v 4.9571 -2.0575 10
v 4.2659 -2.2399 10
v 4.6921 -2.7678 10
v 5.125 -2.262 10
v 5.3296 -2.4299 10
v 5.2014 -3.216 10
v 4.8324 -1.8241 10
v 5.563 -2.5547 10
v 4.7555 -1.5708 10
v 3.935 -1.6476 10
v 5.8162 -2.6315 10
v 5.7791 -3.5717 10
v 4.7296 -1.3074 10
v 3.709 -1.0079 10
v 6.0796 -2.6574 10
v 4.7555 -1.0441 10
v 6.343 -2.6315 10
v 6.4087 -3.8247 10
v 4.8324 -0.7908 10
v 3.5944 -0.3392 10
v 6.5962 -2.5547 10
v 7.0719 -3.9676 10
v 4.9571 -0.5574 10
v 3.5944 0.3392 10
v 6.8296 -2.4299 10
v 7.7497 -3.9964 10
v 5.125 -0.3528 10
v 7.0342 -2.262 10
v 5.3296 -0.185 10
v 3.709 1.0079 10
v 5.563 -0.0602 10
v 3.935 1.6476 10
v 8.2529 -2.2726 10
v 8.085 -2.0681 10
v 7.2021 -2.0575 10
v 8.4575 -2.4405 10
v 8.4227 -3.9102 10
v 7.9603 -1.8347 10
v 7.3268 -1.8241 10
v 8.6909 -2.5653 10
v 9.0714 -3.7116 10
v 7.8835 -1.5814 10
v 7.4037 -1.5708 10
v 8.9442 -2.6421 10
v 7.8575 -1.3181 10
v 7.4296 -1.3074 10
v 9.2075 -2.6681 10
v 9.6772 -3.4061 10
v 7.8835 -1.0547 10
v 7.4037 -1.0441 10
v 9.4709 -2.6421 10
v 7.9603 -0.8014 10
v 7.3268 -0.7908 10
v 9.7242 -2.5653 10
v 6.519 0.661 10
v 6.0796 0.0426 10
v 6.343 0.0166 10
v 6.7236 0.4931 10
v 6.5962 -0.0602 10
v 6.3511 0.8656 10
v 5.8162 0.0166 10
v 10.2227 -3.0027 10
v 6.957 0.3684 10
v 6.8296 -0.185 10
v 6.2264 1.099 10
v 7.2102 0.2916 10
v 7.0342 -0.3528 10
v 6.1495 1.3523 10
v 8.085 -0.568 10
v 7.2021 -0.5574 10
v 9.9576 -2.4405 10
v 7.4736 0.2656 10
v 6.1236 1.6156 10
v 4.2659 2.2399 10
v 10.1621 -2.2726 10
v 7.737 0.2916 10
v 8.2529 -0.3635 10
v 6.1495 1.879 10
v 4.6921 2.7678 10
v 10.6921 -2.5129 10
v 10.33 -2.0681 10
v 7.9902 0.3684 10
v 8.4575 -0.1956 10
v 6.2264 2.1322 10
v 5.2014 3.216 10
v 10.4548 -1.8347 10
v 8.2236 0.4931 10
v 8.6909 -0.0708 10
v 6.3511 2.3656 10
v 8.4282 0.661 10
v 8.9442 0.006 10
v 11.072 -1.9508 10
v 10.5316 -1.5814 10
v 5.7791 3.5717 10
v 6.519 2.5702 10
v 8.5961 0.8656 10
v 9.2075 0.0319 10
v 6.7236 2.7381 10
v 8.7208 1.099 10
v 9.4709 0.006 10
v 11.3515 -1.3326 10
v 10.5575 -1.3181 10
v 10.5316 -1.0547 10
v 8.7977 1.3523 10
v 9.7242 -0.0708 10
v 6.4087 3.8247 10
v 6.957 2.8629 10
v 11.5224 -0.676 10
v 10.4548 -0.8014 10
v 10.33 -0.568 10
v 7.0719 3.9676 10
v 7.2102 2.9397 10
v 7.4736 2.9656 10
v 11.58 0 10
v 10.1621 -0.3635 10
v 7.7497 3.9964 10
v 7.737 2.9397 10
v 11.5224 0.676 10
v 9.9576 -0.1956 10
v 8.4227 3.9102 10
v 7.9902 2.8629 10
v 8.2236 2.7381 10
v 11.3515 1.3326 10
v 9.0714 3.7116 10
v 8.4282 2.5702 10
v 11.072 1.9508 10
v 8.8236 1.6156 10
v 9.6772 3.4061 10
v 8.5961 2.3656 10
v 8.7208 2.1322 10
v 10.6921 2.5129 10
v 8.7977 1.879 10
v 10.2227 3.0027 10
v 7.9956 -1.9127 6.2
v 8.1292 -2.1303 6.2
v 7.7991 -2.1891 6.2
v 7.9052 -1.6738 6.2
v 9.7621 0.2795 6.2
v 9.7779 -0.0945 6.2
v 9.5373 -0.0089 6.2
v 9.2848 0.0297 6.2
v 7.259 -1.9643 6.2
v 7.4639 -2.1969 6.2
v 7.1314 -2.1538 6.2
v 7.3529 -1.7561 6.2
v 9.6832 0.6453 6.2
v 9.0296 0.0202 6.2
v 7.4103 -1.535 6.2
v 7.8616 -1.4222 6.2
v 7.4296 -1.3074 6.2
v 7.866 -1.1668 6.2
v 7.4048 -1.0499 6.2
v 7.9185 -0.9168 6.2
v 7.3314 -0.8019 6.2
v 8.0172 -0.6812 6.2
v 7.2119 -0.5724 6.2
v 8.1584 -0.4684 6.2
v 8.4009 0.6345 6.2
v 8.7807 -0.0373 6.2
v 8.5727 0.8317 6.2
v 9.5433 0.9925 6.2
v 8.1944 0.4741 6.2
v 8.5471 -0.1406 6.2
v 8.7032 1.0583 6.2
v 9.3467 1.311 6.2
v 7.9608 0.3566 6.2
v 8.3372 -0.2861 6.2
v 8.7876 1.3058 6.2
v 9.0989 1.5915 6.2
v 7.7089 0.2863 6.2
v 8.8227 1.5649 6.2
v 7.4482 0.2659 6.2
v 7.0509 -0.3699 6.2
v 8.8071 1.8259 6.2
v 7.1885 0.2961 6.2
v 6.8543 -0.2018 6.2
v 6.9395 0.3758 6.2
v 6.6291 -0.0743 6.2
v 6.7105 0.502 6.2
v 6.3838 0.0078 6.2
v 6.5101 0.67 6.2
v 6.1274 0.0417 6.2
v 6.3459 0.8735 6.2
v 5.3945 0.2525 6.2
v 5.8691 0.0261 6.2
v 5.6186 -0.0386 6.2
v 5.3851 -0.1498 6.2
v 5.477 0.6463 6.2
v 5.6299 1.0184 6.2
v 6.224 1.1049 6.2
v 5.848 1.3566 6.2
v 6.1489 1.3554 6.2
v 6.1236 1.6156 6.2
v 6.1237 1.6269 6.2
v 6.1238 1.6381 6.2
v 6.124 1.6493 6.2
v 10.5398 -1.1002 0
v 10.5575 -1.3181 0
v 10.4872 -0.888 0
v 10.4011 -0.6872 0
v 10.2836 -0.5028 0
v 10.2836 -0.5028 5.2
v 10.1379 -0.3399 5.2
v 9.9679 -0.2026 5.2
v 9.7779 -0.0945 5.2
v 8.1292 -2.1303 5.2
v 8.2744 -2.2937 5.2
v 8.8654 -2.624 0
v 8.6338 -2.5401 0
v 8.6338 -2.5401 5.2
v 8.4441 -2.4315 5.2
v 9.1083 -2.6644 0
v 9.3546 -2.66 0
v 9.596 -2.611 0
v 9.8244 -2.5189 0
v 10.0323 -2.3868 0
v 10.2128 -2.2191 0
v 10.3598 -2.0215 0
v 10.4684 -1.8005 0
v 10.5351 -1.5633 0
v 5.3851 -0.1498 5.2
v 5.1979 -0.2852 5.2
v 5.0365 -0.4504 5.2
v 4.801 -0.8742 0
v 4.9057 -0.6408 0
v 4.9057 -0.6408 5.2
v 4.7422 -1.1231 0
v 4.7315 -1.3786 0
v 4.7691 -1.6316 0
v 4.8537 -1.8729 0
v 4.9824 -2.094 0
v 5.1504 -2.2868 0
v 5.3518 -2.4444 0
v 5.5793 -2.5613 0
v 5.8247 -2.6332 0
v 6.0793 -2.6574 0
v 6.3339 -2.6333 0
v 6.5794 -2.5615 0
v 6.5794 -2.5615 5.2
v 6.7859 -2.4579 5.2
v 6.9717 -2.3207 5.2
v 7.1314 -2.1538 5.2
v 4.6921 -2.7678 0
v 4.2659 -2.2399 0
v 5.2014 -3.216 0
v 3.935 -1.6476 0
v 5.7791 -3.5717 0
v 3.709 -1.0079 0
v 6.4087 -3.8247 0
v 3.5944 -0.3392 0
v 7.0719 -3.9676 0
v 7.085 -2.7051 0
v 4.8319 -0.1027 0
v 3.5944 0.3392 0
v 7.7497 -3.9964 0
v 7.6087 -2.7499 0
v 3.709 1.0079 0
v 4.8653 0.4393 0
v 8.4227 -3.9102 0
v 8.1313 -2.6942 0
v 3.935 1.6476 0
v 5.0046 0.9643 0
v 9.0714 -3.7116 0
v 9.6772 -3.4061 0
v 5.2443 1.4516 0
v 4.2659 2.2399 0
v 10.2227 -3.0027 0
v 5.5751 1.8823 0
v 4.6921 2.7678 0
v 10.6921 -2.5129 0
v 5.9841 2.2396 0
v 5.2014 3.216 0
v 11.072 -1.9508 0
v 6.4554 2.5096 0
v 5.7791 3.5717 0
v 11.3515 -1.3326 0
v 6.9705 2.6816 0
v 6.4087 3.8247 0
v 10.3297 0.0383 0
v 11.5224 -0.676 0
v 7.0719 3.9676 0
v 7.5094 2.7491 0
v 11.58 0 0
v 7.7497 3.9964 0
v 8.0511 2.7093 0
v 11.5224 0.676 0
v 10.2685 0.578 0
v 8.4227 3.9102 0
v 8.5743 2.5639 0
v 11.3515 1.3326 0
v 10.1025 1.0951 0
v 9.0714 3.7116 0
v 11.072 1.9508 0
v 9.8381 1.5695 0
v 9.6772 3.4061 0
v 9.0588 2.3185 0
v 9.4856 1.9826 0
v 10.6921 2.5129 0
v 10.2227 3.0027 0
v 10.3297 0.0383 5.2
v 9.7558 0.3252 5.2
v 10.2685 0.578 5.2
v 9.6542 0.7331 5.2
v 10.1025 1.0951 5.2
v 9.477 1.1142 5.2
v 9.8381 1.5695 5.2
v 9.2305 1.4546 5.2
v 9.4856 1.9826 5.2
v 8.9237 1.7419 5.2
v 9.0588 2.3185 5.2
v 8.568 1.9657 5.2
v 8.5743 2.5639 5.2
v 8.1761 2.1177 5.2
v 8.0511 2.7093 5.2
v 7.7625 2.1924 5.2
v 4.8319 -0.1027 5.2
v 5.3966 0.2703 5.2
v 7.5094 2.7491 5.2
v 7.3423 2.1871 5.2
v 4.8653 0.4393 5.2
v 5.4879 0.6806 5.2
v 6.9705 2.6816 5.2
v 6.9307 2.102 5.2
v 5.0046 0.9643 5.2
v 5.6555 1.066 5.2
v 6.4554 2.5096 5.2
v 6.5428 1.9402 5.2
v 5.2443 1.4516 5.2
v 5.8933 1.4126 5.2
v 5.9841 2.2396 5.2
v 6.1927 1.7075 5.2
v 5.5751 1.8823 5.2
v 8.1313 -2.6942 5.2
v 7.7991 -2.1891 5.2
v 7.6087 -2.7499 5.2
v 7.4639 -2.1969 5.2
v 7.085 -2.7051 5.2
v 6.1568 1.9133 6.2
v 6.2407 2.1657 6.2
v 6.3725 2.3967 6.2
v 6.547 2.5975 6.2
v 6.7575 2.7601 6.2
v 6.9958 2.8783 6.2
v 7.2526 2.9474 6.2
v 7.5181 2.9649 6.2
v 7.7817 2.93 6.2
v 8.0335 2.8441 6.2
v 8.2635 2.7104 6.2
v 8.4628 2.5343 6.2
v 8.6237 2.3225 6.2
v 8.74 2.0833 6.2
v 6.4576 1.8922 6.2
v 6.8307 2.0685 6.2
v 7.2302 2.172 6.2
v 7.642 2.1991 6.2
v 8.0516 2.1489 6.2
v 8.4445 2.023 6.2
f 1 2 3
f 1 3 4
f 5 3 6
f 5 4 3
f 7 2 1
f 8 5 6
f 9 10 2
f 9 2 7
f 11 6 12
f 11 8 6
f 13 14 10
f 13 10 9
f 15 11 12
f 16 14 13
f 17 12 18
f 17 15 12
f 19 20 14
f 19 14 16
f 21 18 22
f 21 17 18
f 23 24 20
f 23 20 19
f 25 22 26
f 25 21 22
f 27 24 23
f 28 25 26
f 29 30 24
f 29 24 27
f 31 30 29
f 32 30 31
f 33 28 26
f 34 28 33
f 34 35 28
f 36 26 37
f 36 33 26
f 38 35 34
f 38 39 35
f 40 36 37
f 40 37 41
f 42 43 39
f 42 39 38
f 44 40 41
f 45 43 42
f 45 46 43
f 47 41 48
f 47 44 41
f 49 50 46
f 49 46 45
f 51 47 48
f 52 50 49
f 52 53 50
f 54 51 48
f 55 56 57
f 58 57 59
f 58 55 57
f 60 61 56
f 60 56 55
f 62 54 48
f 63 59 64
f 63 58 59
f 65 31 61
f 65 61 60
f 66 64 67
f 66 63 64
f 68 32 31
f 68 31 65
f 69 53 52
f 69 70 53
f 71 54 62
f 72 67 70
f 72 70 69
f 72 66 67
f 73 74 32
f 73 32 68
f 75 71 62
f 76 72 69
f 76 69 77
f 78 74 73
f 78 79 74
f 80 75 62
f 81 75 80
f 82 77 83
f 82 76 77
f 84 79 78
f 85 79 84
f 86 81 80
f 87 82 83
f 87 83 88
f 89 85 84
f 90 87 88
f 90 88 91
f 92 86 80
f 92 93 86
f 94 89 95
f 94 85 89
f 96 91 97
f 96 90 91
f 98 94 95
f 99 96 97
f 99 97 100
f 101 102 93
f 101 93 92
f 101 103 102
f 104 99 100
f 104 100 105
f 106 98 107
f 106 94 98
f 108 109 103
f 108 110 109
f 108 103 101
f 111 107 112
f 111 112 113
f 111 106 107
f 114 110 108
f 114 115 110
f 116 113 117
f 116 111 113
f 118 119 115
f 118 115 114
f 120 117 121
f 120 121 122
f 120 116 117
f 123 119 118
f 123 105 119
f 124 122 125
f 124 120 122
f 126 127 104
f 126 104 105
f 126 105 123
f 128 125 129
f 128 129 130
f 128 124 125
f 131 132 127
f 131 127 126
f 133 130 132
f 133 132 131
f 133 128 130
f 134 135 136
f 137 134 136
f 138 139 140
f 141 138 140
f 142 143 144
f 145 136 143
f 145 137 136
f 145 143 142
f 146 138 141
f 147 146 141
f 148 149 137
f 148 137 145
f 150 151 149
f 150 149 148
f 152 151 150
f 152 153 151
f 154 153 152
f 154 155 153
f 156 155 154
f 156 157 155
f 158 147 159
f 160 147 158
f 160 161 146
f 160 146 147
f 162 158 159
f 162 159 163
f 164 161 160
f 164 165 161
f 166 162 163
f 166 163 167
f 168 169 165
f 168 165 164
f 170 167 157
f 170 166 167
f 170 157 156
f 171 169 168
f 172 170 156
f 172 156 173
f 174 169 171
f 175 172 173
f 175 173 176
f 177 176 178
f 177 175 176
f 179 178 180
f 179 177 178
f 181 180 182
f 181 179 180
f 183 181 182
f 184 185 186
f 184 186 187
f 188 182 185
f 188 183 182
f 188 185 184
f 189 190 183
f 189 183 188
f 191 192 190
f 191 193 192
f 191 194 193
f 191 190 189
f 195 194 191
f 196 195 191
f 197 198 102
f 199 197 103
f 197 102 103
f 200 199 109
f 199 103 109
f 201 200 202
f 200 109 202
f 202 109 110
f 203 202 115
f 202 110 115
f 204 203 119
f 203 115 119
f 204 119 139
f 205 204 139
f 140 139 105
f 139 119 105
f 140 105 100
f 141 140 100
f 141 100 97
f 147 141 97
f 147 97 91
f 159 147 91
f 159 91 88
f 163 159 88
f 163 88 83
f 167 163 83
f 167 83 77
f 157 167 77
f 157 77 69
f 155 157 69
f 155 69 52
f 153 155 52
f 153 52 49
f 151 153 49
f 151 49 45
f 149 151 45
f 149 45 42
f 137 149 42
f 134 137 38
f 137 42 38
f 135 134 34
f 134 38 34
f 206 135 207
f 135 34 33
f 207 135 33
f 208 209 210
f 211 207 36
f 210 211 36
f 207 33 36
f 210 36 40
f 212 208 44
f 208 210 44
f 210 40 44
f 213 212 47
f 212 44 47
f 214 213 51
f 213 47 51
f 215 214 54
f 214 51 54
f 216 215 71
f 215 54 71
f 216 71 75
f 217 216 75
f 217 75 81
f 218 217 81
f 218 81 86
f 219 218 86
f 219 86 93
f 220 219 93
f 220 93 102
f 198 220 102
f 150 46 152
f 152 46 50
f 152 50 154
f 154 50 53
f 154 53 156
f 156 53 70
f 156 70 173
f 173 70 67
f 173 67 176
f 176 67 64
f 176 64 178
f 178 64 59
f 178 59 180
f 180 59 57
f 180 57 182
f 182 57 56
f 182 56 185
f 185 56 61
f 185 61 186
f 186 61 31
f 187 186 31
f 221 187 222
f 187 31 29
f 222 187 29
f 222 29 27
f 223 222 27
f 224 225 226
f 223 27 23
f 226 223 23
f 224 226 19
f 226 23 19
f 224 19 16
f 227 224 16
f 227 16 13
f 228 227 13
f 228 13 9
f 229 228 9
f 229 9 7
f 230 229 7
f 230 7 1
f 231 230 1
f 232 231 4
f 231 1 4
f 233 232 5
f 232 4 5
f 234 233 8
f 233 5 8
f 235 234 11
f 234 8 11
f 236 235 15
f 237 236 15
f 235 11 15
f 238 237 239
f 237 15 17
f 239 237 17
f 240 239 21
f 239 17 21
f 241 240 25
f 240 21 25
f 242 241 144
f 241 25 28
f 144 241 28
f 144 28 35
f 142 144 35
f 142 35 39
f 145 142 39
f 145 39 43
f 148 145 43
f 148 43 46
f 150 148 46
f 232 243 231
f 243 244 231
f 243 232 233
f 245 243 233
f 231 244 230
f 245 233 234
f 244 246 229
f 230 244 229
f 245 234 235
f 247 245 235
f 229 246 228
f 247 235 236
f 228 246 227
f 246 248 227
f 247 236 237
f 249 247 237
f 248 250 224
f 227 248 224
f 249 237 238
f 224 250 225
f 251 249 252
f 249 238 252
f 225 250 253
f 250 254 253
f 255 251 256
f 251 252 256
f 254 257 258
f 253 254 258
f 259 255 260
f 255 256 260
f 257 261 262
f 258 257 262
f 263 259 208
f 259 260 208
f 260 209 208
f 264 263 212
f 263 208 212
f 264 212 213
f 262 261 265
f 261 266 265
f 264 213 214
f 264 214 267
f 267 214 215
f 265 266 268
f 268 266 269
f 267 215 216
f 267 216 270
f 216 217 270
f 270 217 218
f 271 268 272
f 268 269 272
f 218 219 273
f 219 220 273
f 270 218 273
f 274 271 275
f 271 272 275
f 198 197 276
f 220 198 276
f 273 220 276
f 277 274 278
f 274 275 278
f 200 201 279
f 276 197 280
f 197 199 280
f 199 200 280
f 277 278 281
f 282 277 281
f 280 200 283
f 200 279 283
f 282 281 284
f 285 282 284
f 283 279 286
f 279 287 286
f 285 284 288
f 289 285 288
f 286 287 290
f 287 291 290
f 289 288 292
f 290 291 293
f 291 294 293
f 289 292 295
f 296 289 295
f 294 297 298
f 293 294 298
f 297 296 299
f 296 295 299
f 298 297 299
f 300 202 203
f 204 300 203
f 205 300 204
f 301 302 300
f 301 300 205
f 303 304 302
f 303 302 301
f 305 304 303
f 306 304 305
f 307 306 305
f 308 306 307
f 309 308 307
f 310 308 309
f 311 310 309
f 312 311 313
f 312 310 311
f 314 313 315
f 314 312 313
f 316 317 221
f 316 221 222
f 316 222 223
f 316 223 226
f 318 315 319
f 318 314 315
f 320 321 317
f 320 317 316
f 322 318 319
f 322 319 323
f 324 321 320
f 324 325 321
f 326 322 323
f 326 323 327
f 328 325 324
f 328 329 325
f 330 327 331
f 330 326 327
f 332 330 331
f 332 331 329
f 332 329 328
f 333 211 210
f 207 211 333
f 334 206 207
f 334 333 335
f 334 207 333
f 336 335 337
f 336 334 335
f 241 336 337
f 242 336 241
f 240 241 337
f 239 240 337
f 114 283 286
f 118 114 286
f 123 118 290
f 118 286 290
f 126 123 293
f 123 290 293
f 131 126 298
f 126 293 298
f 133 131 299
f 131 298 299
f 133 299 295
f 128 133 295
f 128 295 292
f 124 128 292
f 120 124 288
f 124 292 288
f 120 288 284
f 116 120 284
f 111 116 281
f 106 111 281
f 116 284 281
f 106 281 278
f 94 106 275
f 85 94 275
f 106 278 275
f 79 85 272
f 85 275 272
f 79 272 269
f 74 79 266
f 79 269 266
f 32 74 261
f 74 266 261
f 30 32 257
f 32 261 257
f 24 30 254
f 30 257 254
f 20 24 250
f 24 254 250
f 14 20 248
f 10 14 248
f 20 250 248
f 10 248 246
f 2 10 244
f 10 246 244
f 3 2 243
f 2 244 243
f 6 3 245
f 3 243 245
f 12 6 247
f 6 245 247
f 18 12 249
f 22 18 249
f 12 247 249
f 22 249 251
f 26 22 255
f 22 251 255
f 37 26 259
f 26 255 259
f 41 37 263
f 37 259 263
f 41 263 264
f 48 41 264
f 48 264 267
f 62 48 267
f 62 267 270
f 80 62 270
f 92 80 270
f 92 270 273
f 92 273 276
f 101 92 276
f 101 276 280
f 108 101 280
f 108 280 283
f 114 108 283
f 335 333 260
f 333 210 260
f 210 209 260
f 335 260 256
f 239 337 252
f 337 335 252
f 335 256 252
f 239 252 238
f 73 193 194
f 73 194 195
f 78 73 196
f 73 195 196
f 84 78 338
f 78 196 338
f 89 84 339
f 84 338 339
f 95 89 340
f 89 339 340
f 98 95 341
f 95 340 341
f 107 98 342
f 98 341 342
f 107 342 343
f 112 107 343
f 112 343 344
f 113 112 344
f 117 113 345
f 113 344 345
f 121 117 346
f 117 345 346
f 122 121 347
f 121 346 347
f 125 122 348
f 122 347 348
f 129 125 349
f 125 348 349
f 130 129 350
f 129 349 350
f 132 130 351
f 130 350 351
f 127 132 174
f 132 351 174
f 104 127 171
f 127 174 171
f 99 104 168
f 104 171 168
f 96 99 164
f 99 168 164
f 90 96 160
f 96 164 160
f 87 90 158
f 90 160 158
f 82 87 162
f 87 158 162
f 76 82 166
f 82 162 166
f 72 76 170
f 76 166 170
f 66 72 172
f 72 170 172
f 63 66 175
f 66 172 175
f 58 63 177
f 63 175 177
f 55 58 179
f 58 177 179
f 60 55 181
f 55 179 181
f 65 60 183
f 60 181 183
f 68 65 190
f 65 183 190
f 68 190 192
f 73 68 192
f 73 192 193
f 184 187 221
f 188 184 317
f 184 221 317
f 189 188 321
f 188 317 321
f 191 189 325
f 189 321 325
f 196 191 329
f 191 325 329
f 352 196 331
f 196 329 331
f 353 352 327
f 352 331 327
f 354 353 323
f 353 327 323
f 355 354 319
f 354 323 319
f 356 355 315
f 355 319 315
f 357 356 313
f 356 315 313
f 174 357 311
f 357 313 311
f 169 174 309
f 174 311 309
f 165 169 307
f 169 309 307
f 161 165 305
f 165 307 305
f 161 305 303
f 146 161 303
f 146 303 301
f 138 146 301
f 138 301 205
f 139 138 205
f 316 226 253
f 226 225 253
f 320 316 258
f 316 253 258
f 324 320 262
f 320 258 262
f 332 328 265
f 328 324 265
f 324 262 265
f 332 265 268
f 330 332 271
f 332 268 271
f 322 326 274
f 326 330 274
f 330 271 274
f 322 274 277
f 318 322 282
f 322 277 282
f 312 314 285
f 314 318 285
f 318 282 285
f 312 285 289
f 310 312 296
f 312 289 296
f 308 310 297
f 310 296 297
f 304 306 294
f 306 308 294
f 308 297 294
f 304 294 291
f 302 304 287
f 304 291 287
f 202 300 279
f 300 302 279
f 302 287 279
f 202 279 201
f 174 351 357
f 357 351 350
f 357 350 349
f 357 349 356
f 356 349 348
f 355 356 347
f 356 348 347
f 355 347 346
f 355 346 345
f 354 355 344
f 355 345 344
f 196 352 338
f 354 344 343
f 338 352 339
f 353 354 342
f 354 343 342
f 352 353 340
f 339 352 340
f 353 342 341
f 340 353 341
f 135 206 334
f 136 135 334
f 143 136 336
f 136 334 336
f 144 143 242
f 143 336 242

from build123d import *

# Parameters (mm, degrees)
SKETCH5_R           = 4
BOSS_EXTRUDE2_DEPTH = 10
SKETCH6_R           = 2.75
CUT_EXTRUDE4_DEPTH  = 5.2
SKETCH7_R           = 2.2
CUT_EXTRUDE5_DEPTH  = 1
SKETCH9_R           = 1.35
CUT_EXTRUDE6_DEPTH  = 15.623631801
SKETCH10_R          = 1.35
CUT_EXTRUDE7_DEPTH  = 16.81440762
SKETCH11_R          = 1.35
CUT_EXTRUDE8_DEPTH  = 17.02035176


with BuildPart() as part:
    # Sketch5 → Boss-Extrude2 (new body)
    with BuildSketch(Plane.XY):
        with Locations((7.579960637, 0)):
            Circle(SKETCH5_R)
    extrude(amount=BOSS_EXTRUDE2_DEPTH)

    # Sketch6 → Cut-Extrude4 (cut)
    with BuildSketch(Plane(origin=(0, 0, 0), x_dir=(-1, 0, 0), z_dir=(0, 0, -1))):
        with Locations((-7.579960637, 0)):
            Circle(SKETCH6_R)
    extrude(amount=-CUT_EXTRUDE4_DEPTH, mode=Mode.SUBTRACT)

    # Sketch7 → Cut-Extrude5 (cut)
    with BuildSketch(Plane(origin=(0, 0, 5.2), x_dir=(-1, 0, 0), z_dir=(0, 0, -1))):
        with Locations((-7.579960637, 0)):
            Circle(SKETCH7_R)
    extrude(amount=-CUT_EXTRUDE5_DEPTH, mode=Mode.SUBTRACT)

    # Sketch9 → Cut-Extrude6 (cut, through all)
    with BuildSketch(Plane(origin=(-0.808601663, 0.683388857, 6.2), x_dir=(-1, 0, 0), z_dir=(0, 0, -1))):
        with Locations((-8.28220496, 0.932237564)):
            Circle(SKETCH9_R)
    extrude(amount=-CUT_EXTRUDE6_DEPTH, mode=Mode.SUBTRACT)

    # Sketch10 → Cut-Extrude7 (cut, through all)
    with BuildSketch(Plane.XY.offset(10)):
        with Locations((6.079595945, -1.307435574)):
            Circle(SKETCH10_R)
    extrude(amount=-CUT_EXTRUDE7_DEPTH, mode=Mode.SUBTRACT)

    # Sketch11 → Cut-Extrude8 (cut, through all)
    with BuildSketch(Plane(origin=(0, 0.749334917, 10), x_dir=(1, 0, 0), z_dir=(0, 0, 1))):
        with Locations((9.207532027, -2.067387295)):
            Circle(SKETCH11_R)
    extrude(amount=-CUT_EXTRUDE8_DEPTH, mode=Mode.SUBTRACT)


solid = part.part
